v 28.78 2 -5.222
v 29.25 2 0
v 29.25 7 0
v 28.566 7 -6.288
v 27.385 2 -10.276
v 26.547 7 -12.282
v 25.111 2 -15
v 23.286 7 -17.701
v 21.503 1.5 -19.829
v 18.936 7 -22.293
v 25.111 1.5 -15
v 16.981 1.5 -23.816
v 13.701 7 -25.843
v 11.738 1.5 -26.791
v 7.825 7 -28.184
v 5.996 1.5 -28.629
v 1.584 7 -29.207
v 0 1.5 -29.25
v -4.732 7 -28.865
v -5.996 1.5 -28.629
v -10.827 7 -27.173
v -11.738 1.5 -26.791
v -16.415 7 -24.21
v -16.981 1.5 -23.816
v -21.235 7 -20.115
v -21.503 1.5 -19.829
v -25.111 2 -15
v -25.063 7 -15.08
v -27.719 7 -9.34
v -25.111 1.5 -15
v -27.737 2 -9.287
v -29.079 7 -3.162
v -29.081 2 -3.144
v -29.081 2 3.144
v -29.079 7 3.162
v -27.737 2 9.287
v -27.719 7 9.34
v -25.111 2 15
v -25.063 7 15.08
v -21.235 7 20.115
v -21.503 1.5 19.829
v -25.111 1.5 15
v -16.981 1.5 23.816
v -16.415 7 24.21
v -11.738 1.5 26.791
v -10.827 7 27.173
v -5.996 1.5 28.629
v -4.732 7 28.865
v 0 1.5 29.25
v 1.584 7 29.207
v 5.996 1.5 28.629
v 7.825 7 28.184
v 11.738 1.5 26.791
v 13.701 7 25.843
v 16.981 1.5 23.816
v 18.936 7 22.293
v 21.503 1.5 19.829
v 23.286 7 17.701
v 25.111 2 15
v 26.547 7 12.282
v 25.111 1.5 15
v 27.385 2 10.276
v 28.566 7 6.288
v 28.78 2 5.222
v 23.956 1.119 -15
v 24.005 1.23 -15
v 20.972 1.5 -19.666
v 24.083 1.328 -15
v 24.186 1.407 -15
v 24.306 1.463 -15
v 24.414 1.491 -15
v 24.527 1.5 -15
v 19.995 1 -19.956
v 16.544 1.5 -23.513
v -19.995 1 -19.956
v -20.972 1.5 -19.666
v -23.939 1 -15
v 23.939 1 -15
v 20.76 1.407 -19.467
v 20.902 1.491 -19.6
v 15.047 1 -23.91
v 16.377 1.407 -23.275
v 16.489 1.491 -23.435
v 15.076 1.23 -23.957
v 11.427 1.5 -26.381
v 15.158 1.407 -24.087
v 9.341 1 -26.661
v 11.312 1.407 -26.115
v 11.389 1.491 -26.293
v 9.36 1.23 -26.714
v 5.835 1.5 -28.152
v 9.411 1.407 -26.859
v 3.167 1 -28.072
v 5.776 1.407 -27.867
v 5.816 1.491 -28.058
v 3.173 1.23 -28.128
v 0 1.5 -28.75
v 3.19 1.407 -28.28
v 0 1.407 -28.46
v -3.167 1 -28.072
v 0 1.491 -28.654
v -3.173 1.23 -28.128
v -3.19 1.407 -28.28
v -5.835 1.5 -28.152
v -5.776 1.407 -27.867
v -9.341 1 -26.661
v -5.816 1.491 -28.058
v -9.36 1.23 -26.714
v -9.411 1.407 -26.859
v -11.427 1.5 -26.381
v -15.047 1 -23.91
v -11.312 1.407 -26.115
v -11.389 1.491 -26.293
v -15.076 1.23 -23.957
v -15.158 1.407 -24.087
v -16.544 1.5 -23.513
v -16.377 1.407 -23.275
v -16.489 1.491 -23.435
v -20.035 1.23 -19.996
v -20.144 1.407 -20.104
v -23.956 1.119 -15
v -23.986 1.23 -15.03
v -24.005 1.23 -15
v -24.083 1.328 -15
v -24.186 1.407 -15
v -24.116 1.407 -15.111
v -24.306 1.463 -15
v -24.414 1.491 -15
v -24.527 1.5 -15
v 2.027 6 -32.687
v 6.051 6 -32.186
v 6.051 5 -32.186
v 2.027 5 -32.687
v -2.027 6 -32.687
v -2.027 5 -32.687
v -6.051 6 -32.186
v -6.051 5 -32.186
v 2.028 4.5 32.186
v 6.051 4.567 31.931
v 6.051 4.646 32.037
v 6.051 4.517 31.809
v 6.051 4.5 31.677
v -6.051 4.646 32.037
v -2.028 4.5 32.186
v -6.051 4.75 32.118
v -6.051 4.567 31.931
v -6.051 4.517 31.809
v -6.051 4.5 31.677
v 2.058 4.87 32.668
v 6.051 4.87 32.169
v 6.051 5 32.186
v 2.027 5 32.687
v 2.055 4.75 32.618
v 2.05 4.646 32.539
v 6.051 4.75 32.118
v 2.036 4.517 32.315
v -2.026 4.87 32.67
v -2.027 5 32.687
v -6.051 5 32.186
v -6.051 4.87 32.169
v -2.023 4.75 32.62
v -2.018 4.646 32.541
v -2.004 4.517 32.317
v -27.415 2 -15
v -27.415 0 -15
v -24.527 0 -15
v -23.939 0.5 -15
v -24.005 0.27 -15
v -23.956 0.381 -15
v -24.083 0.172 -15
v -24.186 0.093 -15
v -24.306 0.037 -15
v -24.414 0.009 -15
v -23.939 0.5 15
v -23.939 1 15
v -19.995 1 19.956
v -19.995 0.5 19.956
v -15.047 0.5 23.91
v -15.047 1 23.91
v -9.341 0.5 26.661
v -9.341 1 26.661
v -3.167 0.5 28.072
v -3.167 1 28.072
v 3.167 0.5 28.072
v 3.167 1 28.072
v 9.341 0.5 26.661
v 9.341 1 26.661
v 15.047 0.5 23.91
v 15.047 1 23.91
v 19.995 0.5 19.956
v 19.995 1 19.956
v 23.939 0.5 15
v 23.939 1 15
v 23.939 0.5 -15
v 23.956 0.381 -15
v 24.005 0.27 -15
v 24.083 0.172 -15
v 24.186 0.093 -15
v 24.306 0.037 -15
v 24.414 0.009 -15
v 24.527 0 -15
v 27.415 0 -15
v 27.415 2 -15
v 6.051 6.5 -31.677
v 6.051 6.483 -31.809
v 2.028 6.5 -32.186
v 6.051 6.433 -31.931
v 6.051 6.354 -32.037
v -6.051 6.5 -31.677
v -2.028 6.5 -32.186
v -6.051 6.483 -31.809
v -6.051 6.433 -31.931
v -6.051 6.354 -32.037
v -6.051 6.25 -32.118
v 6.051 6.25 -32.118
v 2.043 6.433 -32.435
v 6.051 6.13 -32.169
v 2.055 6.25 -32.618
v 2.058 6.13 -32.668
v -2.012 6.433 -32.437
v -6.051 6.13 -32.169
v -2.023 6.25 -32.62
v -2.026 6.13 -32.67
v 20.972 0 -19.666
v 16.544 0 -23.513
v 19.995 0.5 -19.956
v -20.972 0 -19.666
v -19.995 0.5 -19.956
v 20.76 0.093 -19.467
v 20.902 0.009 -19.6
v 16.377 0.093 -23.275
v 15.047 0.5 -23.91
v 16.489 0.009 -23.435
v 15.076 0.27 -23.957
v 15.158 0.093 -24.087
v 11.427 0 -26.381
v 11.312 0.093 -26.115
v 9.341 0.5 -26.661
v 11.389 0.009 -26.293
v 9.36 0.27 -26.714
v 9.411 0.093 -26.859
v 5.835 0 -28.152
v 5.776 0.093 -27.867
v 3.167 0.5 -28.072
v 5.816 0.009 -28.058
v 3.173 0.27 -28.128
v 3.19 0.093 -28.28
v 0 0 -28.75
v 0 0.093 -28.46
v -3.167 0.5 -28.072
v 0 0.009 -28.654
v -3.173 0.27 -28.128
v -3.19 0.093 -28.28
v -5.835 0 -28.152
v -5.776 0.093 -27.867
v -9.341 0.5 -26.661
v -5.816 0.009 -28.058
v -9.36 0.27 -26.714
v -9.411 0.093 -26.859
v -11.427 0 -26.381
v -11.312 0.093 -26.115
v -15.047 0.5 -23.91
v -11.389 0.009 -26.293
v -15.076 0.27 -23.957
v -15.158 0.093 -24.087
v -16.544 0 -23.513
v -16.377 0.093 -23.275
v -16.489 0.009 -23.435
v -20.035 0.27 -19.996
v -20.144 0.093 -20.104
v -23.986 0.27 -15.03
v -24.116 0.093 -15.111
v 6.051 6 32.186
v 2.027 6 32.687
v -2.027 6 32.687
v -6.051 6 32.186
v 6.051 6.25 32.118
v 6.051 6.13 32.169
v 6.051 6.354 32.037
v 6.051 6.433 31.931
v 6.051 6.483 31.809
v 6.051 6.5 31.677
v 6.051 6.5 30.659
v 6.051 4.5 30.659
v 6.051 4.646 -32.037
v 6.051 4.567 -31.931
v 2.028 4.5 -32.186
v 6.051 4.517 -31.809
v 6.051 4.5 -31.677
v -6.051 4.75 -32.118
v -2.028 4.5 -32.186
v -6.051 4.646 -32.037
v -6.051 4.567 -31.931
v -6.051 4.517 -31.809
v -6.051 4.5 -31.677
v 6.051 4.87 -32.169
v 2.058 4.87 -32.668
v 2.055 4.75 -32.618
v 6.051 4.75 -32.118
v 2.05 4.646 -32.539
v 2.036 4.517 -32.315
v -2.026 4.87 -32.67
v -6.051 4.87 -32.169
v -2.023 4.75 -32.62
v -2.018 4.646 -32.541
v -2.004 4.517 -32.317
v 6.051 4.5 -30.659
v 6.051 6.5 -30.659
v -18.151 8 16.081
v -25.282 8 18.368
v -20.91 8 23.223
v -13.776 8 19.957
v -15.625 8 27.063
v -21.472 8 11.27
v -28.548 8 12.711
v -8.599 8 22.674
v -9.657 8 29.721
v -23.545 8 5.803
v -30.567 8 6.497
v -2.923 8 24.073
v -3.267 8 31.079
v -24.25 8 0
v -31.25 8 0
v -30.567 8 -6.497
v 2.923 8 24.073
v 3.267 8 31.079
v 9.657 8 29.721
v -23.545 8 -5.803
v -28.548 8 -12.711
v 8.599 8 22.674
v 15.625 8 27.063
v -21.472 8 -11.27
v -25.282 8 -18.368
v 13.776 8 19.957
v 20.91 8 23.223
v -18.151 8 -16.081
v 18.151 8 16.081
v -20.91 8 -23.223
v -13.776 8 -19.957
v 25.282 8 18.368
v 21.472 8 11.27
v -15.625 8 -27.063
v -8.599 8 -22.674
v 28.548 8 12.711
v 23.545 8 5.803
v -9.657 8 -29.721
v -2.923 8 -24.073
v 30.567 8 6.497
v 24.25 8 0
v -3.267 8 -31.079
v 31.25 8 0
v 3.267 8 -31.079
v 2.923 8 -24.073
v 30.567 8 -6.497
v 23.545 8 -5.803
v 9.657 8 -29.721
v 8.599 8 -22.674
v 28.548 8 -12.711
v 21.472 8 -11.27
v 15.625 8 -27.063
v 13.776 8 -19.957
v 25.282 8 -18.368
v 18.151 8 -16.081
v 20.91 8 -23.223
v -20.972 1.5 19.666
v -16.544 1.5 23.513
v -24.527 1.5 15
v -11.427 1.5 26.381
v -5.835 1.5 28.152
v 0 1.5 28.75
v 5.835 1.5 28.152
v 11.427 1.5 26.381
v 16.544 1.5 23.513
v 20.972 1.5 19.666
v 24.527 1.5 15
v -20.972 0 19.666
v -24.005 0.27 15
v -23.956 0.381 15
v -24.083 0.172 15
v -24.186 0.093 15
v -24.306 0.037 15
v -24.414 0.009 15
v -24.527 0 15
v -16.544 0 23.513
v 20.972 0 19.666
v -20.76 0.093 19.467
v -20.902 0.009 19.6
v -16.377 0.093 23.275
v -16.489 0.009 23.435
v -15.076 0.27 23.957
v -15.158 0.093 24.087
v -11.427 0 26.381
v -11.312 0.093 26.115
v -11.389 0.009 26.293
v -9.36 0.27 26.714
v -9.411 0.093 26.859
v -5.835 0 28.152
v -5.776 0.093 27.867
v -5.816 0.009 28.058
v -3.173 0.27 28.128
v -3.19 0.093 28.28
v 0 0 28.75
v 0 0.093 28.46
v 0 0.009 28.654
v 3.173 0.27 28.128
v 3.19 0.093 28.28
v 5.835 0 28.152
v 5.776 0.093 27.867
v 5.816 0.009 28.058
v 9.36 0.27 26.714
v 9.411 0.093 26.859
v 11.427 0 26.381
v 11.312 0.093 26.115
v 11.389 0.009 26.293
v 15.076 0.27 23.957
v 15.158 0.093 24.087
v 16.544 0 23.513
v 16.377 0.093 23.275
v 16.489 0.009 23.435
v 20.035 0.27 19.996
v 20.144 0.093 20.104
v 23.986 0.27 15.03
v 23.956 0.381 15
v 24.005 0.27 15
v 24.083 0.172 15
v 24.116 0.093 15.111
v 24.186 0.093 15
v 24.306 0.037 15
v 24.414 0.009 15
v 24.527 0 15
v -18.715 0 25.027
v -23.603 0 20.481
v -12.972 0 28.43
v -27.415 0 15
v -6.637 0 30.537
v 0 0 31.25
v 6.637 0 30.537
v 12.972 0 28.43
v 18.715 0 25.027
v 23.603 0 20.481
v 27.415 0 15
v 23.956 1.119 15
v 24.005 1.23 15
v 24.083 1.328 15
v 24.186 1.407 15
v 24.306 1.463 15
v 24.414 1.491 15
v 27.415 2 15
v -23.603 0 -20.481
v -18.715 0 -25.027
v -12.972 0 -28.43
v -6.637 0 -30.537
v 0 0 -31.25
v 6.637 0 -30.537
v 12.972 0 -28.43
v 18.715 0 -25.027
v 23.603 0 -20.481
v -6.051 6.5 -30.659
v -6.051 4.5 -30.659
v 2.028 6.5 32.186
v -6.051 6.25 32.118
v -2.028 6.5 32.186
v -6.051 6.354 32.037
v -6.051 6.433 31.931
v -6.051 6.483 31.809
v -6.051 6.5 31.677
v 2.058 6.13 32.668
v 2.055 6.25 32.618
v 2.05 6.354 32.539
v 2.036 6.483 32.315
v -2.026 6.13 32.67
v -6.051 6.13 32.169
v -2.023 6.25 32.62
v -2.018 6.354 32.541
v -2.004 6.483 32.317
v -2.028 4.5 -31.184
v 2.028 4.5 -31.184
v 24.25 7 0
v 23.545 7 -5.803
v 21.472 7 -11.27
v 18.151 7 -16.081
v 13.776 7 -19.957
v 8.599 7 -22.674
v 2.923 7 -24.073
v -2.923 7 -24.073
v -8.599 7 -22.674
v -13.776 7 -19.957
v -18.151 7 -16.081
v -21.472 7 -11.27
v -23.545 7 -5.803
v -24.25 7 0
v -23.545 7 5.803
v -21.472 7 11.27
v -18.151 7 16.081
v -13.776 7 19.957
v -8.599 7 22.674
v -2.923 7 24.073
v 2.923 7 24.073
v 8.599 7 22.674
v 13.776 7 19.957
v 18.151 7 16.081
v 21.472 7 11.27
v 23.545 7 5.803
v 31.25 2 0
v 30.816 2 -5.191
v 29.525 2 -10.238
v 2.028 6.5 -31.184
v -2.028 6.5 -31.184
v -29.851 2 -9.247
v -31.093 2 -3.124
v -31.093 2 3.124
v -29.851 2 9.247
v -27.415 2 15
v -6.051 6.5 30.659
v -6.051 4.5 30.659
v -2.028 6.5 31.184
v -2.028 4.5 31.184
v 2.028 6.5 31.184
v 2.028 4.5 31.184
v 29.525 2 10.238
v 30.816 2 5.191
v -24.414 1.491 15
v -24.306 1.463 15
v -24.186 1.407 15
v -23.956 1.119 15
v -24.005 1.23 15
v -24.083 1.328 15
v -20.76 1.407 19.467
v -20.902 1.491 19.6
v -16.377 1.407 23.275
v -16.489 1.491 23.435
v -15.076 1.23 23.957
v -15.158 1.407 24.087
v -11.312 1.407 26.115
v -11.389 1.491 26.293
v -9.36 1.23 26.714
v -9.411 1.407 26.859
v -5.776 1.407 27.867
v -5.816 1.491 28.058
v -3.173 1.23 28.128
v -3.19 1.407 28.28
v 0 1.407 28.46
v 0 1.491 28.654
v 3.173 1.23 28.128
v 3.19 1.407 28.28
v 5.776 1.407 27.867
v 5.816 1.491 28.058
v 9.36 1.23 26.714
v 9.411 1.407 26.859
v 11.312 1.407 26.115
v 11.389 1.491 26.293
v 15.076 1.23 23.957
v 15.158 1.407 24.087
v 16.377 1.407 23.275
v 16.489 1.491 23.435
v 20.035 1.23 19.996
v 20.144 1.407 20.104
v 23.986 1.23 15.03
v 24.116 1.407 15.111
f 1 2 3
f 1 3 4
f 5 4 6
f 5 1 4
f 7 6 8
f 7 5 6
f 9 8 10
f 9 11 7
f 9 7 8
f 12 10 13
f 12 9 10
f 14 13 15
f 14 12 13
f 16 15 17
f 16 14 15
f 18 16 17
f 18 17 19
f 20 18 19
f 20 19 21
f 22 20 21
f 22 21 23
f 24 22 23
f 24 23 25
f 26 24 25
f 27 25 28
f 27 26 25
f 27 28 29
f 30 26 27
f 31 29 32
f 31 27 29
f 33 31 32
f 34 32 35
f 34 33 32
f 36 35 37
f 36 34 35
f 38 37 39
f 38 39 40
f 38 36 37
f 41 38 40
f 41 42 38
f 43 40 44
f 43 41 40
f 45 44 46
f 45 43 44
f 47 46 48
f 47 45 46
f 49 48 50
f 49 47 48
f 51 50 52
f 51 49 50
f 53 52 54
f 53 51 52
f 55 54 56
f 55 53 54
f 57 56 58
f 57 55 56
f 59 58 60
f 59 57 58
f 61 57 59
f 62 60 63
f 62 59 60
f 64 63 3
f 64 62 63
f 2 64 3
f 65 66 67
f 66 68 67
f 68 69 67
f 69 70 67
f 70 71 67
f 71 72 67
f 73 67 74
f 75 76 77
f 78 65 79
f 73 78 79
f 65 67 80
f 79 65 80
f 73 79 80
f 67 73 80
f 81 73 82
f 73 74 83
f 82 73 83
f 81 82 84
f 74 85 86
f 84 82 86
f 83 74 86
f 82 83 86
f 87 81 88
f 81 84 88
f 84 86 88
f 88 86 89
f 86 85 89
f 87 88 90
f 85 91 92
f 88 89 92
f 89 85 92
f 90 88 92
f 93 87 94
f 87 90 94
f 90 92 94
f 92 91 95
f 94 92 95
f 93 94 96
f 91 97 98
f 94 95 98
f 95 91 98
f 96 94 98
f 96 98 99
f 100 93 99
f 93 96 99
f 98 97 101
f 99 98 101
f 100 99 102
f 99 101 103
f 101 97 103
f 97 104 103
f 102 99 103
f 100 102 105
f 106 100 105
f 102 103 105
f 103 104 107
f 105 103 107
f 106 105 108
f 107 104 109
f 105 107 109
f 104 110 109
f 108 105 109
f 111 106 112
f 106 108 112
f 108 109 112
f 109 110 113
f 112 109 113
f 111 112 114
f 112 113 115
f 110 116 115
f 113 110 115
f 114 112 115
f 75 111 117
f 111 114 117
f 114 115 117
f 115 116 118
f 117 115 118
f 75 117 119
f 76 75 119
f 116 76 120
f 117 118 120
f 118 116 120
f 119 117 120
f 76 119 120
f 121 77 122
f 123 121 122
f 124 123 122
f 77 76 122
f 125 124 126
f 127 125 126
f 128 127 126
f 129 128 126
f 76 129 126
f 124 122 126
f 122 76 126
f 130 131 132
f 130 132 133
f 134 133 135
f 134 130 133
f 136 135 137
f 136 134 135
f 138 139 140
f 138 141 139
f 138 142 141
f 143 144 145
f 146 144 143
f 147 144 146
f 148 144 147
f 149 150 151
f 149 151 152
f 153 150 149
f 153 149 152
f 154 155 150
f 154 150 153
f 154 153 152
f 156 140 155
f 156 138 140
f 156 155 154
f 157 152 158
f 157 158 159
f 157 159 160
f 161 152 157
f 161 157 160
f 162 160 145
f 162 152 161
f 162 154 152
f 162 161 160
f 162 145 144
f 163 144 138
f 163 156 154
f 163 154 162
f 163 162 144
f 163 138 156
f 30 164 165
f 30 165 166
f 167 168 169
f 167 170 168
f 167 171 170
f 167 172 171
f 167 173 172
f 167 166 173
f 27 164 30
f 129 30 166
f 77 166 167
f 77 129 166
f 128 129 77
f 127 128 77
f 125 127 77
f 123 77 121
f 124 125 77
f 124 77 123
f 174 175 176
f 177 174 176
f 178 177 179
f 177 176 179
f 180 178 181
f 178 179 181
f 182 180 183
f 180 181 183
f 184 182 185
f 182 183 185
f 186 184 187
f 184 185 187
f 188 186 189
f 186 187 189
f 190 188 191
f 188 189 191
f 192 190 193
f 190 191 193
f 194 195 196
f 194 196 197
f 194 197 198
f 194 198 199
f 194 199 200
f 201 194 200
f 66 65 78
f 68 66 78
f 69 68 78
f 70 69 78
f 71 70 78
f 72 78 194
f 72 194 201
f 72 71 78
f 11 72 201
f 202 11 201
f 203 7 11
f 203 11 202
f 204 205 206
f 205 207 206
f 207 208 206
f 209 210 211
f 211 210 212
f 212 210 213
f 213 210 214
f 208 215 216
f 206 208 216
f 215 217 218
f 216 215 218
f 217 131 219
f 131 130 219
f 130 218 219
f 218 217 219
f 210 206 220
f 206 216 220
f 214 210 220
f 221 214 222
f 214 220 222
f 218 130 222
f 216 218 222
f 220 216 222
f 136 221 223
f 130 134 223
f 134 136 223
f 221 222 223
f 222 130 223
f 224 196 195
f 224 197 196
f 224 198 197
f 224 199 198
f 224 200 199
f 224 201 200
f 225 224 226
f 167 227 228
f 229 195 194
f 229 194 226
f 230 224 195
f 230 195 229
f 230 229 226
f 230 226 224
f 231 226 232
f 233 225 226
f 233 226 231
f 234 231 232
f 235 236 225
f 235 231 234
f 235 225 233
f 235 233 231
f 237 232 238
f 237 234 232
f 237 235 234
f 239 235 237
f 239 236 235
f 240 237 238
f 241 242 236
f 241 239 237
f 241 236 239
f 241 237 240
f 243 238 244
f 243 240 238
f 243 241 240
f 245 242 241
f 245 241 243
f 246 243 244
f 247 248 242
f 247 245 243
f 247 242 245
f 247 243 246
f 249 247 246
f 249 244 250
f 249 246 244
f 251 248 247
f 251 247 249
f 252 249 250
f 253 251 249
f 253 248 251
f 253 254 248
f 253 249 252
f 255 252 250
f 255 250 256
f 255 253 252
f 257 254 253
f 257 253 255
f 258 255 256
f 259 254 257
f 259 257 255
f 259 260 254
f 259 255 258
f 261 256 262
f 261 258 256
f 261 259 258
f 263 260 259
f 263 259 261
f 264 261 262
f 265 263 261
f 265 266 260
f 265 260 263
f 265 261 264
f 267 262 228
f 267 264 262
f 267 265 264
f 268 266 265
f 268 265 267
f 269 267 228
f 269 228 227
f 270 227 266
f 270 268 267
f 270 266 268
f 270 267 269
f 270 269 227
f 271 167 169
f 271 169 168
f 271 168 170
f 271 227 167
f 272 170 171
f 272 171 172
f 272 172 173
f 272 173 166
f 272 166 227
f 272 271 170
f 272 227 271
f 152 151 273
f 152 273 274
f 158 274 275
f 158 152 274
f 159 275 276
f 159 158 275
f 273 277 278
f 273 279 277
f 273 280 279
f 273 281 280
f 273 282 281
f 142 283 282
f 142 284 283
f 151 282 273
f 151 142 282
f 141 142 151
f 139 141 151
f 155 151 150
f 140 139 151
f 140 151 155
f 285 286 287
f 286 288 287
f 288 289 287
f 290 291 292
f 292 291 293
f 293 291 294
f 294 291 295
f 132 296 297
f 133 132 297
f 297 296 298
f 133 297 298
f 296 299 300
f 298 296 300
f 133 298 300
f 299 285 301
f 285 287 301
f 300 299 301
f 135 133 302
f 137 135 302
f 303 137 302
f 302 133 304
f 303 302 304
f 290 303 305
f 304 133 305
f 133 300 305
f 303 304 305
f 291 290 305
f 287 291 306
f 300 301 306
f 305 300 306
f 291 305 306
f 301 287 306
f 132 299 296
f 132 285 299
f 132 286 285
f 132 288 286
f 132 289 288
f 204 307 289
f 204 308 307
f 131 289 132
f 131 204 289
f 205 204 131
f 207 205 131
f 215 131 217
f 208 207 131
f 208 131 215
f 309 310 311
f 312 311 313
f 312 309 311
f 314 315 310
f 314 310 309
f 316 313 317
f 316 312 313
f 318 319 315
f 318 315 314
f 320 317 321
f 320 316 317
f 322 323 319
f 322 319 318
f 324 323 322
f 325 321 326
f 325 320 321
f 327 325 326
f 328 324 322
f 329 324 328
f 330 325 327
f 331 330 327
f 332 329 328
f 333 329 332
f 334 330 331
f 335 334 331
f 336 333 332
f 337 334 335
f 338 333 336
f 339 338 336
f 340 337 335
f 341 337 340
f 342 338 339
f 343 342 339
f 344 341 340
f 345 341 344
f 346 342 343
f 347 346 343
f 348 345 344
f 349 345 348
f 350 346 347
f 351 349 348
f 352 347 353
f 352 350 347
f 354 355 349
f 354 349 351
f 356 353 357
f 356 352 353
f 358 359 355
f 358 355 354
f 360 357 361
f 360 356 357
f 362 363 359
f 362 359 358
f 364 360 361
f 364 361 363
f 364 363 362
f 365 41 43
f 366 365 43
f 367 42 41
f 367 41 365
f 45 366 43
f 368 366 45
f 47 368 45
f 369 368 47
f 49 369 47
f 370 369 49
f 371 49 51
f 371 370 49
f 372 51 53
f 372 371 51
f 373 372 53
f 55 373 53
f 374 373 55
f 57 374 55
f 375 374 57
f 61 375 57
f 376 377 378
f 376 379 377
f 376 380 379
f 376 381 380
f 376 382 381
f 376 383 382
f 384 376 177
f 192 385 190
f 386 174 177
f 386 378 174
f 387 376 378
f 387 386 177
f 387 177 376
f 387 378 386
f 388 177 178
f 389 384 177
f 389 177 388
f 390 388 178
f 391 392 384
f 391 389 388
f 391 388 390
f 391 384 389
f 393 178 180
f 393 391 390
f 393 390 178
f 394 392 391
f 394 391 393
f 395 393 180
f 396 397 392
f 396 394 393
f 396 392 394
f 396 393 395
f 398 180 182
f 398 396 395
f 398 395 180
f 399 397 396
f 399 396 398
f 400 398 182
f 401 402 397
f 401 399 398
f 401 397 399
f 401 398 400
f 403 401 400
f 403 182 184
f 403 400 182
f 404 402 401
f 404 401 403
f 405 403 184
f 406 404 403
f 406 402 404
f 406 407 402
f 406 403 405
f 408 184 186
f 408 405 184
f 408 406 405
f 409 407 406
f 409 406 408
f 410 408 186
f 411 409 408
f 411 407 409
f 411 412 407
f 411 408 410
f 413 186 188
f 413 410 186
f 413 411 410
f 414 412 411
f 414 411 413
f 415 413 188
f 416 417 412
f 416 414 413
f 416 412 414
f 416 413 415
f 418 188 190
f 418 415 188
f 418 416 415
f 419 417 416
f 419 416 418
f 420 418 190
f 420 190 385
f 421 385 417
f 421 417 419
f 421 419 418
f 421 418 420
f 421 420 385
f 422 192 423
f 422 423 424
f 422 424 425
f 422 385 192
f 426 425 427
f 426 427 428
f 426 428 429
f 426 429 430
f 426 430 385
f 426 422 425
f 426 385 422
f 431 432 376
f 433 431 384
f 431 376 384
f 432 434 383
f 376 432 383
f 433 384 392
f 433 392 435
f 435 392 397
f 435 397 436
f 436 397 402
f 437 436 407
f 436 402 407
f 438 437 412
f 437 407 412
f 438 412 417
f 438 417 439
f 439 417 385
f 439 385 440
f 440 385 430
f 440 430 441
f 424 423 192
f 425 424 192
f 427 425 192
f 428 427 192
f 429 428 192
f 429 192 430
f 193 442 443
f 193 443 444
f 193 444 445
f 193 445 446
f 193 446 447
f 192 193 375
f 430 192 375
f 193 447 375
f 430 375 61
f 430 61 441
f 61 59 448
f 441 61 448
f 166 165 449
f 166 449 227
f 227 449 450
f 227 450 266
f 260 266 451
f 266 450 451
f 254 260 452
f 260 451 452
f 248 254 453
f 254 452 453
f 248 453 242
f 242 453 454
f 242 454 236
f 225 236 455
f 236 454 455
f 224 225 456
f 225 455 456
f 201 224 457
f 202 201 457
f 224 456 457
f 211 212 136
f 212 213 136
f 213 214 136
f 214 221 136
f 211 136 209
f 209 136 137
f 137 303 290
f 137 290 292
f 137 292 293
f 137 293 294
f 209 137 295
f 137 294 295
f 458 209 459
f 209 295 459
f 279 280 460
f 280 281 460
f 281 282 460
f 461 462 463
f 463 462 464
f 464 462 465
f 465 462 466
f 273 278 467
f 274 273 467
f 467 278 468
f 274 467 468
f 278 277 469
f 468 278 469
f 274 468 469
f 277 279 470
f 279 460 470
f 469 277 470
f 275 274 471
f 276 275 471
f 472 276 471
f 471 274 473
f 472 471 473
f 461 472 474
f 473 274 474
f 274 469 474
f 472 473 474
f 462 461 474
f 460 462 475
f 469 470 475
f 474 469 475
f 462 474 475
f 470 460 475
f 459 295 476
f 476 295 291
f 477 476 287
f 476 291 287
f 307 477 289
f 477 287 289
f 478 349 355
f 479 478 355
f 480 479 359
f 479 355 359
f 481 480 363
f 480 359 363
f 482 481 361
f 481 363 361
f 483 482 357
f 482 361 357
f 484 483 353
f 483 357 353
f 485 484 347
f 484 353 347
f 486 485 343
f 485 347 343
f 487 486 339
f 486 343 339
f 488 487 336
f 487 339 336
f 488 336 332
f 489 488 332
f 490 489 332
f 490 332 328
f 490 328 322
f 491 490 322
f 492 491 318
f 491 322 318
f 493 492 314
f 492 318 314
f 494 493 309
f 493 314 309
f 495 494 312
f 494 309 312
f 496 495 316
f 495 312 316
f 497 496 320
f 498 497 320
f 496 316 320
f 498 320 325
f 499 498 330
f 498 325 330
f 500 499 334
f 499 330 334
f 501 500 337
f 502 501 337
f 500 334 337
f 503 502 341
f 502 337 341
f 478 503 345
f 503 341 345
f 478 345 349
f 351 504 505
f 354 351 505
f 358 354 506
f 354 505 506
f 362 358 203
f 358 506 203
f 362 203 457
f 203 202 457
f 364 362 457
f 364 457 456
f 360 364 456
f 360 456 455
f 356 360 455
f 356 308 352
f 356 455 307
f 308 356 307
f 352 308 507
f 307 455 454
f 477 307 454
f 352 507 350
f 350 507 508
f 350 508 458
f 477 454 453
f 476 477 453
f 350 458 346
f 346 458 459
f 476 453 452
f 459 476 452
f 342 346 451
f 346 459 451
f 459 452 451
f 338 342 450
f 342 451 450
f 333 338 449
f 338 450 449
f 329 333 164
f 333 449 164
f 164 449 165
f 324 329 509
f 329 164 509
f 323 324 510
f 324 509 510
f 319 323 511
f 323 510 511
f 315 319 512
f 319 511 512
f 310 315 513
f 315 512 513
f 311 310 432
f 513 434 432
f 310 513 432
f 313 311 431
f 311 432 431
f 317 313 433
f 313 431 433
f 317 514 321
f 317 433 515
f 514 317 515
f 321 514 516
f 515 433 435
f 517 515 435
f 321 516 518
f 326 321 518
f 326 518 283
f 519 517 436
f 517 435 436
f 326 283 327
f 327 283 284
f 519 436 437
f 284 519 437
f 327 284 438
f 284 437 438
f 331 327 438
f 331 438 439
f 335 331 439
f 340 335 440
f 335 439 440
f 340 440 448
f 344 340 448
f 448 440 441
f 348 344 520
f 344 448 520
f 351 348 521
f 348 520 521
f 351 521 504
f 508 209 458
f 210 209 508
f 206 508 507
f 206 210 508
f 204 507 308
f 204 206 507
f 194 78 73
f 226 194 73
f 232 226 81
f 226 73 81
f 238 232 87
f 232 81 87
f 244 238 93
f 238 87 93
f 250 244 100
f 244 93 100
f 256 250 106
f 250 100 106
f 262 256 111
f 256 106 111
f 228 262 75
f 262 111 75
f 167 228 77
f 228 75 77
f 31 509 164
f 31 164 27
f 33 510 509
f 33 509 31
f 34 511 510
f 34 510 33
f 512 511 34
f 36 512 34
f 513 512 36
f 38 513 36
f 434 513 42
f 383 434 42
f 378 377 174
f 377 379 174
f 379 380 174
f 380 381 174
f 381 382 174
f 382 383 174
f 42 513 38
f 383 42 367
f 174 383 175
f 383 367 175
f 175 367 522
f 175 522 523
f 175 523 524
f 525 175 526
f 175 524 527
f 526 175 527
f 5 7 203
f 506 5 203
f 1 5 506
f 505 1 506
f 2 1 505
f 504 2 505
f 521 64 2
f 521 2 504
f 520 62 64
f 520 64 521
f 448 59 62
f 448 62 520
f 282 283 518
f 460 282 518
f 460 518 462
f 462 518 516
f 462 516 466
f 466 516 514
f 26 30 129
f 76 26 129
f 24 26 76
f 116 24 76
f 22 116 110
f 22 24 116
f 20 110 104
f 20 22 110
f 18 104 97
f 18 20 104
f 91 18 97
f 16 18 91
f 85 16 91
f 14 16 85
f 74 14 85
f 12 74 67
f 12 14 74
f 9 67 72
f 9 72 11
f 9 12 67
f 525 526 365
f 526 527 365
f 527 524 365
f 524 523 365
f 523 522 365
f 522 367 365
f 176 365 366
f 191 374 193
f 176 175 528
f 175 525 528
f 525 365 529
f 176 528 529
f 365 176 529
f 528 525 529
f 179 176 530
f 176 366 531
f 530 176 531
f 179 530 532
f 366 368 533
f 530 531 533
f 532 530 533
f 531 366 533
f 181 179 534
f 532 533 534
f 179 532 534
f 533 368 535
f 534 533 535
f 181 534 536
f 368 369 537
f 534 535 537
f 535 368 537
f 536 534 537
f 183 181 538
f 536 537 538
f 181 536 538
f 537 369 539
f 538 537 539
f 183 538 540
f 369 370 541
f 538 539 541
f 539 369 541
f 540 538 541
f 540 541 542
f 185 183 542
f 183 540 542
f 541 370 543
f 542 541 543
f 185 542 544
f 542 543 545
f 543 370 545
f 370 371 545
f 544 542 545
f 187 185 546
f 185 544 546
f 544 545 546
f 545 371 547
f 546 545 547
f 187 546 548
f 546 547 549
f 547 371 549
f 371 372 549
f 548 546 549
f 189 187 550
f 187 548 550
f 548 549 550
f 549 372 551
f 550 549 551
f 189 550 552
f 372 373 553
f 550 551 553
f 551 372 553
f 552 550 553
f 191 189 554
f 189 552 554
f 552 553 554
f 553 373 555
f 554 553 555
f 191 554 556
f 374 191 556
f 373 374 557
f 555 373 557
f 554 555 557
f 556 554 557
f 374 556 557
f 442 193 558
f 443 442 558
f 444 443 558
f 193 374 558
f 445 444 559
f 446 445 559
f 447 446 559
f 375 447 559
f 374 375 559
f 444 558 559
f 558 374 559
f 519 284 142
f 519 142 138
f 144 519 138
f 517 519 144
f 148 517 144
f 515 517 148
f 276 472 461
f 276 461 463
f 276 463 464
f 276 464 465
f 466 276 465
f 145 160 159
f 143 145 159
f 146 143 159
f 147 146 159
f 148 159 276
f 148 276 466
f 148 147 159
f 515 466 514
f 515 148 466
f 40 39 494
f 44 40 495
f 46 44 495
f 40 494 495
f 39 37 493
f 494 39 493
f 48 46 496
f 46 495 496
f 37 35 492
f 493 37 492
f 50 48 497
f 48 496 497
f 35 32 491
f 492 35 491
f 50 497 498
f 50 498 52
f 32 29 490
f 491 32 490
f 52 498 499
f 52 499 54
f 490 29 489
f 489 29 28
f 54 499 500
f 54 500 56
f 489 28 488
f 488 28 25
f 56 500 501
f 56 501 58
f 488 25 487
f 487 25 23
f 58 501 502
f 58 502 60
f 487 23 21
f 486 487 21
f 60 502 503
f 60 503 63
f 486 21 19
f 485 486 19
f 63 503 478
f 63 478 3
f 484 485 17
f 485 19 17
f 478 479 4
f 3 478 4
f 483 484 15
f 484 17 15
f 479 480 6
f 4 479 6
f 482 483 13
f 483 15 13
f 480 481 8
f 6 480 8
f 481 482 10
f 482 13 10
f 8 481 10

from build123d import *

# Parameters (mm, degrees)
SKETCH1_R                = 31.25
SKETCH1_R_2              = 29.25
BOSS_EXTRUDE2_DEPTH      = 8
SKETCH3_R                = 29.25
SKETCH3_R_2              = 28.25
BOSS_EXTRUDE3_DEPTH      = 1.5
FILLET1_R                = 0.5
SKETCH4_R                = 29.25
SKETCH4_R_2              = 24.25
BOSS_EXTRUDE4_DEPTH      = 1
CUT_EXTRUDE3_START       = 5
SKETCH5_W                = 70
SKETCH5_H                = 30
CUT_EXTRUDE3_DEPTH       = 2
BOSS_EXTRUDE5_DEPTH      = 1
BOSS_EXTRUDE5_DEPTH_BACK = 1
FILLET3_R                = 0.5


with BuildPart() as part:
    # Sketch1 → Boss-Extrude2 (new body)
    with BuildSketch(Plane(origin=(0, 0, 0), x_dir=(1, 0, 0), z_dir=(0, 1, 0))):
        Circle(SKETCH1_R)
        Circle(SKETCH1_R_2, mode=Mode.SUBTRACT)
    extrude(amount=BOSS_EXTRUDE2_DEPTH)

    # Sketch3 → Boss-Extrude3 (add)
    with BuildSketch(Plane(origin=(0, 1.5, 0), x_dir=(1, 0, 0), z_dir=(0, 1, 0))):
        Circle(SKETCH3_R)
        Circle(SKETCH3_R_2, mode=Mode.SUBTRACT)
    extrude(amount=-BOSS_EXTRUDE3_DEPTH)

    # Fillet1
    fillet1_edges = [part.edges().sort_by_distance(p)[0] for p in [
        (-28.25, 0, 0),
        (-28.25, 1.5, 0),
    ]]
    fillet(fillet1_edges, radius=FILLET1_R)

    # Sketch4 → Boss-Extrude4 (add)
    with BuildSketch(Plane(origin=(0, 8, 0), x_dir=(1, 0, 0), z_dir=(0, 1, 0))):
        Circle(SKETCH4_R)
        Circle(SKETCH4_R_2, mode=Mode.SUBTRACT)
    extrude(amount=-BOSS_EXTRUDE4_DEPTH)

    # Sketch5 → Cut-Extrude3 (cut)
    with BuildSketch(Plane.XZ.offset(-7).offset(CUT_EXTRUDE3_START)):
        Rectangle(SKETCH5_W, SKETCH5_H)
    extrude(amount=CUT_EXTRUDE3_DEPTH, mode=Mode.SUBTRACT)

    # Sketch6 → Boss-Extrude5 (add, two sides)
    with BuildSketch(Plane(origin=(0, 5.5, 0), x_dir=(1, 0, 0), z_dir=(0, 1, 0))) as boss_extrude5_sk:
        with BuildLine():
            Line((6.051043417, 30.658561179), (6.051043417, 32.186136357))
            ThreePointArc((6.051043417, 32.186136357), (0, 32.75), (-6.051043417, 32.186136357))
            Line((-6.051043417, 32.186136357), (-6.051043417, 30.658561179))
            ThreePointArc((-6.051043417, 30.658561179), (0, 31.25), (6.051043417, 30.658561179))
        make_face()
        with BuildLine():
            Line((-6.051043417, -32.186136357), (-6.051043417, -30.658561179))
            ThreePointArc((-6.051043417, -30.658561179), (0, -31.25), (6.051043417, -30.658561179))
            Line((6.051043417, -30.658561179), (6.051043417, -32.186136357))
            ThreePointArc((6.051043417, -32.186136357), (0, -32.75), (-6.051043417, -32.186136357))
        make_face()
    extrude(amount=BOSS_EXTRUDE5_DEPTH)
    extrude(boss_extrude5_sk.sketch, amount=-BOSS_EXTRUDE5_DEPTH_BACK)

    # Fillet3
    fillet3_edges = [part.edges().sort_by_distance(p)[0] for p in [
        (0, 4.5, -32.75),
        (0, 6.5, -32.75),
        (0, 4.5, 32.75),
        (0, 6.5, 32.75),
    ]]
    fillet(fillet3_edges, radius=FILLET3_R)


solid = part.part
